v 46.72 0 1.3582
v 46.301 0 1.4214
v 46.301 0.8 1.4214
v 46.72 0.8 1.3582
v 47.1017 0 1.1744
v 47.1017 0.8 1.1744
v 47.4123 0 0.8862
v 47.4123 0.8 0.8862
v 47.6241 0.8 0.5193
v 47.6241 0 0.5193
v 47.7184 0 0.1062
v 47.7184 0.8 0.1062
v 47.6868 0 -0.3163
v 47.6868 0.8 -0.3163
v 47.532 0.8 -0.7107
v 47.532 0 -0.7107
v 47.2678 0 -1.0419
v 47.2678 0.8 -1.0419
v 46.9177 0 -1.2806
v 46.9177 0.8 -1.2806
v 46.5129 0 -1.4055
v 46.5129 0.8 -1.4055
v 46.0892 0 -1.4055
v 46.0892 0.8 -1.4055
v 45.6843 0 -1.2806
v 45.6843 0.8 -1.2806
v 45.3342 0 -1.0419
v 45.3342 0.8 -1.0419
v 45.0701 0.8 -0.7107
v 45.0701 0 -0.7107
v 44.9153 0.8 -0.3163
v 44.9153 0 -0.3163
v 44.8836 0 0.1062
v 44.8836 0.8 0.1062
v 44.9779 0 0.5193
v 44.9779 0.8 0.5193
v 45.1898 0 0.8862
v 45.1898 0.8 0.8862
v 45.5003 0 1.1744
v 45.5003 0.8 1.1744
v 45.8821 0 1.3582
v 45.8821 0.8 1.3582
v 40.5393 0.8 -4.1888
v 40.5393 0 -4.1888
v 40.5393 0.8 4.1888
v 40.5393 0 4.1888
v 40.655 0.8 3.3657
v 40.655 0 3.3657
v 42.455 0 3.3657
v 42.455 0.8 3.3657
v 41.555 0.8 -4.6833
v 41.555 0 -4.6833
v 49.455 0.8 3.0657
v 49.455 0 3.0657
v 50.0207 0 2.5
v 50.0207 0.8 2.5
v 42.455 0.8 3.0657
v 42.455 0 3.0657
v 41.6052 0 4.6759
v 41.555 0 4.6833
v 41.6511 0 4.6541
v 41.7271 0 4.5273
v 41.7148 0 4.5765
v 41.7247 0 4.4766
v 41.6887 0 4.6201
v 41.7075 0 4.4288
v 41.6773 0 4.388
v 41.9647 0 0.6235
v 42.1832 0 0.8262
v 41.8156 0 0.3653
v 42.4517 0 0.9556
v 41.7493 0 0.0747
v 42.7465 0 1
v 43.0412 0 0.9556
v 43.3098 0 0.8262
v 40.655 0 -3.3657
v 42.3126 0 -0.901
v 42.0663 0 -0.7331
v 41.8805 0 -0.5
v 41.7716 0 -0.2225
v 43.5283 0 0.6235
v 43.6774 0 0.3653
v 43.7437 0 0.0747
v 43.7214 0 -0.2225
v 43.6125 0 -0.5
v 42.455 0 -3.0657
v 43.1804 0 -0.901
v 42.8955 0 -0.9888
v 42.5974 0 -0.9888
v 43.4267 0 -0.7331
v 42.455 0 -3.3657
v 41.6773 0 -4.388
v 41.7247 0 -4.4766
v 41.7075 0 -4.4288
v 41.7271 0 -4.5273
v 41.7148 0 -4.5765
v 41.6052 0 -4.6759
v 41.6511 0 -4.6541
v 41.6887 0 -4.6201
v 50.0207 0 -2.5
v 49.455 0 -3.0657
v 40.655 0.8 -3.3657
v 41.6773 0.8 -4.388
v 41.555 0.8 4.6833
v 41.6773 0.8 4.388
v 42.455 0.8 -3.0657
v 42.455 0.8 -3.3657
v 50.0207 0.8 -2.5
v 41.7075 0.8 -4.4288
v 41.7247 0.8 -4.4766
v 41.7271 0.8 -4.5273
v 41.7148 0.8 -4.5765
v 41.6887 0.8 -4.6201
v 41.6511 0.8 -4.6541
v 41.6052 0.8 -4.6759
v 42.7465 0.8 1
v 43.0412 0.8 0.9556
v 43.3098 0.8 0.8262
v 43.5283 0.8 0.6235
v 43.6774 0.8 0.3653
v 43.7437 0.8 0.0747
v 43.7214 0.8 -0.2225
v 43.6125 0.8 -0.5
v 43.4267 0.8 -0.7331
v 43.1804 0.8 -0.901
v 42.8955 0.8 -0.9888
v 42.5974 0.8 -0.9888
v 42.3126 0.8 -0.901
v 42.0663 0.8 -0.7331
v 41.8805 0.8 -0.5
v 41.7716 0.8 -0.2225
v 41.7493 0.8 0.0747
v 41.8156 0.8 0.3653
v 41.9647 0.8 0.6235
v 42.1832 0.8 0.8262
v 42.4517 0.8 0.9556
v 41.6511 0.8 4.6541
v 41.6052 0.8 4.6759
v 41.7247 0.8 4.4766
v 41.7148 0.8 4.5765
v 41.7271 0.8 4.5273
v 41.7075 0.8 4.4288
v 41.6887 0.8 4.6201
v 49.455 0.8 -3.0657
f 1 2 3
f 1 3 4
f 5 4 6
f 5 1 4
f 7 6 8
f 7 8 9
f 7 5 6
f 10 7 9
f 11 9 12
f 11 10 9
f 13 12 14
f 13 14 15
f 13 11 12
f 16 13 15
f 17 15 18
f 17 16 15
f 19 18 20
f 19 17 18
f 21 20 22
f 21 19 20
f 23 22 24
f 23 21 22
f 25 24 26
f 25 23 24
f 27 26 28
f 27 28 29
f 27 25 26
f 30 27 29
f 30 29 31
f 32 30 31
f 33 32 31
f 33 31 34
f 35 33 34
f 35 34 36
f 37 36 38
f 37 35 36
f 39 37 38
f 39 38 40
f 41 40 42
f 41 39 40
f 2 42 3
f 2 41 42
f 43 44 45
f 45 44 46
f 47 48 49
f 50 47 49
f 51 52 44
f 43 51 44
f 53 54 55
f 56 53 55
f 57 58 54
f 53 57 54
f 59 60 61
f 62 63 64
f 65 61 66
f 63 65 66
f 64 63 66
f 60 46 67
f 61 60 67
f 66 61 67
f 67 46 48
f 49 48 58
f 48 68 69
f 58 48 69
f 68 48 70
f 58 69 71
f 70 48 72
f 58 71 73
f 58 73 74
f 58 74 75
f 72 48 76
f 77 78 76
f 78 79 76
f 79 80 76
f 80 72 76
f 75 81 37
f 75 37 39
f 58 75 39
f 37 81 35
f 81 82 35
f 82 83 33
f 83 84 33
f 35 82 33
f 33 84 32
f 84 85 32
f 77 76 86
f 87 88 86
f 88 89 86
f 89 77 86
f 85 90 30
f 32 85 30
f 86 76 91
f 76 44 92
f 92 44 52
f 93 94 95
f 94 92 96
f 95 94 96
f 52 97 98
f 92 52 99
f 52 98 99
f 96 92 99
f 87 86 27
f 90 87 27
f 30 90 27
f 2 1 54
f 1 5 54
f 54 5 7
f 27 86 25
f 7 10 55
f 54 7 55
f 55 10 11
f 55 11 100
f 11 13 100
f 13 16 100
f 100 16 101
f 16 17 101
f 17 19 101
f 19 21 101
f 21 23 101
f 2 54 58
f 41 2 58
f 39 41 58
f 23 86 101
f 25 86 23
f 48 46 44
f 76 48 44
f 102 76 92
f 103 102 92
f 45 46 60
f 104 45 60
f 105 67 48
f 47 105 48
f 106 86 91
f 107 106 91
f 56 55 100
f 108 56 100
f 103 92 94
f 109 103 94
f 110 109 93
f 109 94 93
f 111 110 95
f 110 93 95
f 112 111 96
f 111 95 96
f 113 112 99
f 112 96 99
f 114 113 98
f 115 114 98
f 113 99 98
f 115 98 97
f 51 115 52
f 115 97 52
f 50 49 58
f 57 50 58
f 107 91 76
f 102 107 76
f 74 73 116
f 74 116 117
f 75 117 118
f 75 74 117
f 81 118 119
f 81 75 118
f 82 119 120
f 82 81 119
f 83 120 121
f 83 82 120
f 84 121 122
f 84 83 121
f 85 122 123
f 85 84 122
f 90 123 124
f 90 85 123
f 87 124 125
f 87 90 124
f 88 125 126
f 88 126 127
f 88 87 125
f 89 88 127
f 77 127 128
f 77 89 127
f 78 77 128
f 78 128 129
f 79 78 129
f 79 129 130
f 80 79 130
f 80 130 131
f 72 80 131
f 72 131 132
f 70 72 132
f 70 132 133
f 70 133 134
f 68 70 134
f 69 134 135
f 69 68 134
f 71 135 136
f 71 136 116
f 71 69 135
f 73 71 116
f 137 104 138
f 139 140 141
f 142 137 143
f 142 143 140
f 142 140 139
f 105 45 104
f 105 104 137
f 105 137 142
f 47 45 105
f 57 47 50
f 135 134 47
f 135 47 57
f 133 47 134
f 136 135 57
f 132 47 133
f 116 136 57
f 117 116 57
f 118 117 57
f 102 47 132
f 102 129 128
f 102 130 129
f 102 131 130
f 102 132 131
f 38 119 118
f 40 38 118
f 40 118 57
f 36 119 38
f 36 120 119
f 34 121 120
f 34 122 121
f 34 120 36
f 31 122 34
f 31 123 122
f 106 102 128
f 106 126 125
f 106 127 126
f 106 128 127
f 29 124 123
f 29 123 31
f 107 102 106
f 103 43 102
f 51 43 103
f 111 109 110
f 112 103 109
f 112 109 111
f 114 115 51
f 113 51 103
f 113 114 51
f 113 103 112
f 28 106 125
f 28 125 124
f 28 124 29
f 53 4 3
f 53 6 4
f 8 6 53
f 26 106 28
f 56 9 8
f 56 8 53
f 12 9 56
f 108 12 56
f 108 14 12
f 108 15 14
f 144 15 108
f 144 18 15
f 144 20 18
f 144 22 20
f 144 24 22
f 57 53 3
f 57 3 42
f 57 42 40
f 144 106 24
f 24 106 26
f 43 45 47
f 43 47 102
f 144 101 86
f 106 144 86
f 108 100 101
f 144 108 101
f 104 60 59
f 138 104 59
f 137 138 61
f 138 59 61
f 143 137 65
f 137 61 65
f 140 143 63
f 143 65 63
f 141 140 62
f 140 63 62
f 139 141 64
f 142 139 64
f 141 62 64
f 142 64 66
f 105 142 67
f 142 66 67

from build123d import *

# Parameters (mm, degrees)
SKETCH3_R           = 1
SKETCH3_R_2         = 1.421368712
BOSS_EXTRUDE1_DEPTH = 0.8


with BuildPart() as part:
    # Sketch3 → Boss-Extrude1 (new body)
    with BuildSketch(Plane(origin=(0, 0, 0), x_dir=(1, 0, 0), z_dir=(0, 1, 0))):
        with BuildLine():
            Line((40.65499317, -3.365685425), (42.45499317, -3.365685425))
            Line((42.45499317, -3.365685425), (42.45499317, -3.065685425))
            Line((42.45499317, -3.065685425), (49.45499317, -3.065685425))
            Line((49.45499317, -3.065685425), (50.020678594, -2.5))
            Line((50.020678594, -2.5), (50.020678594, 2.5))
            Line((50.020678594, 2.5), (49.45499317, 3.065685425))
            Line((49.45499317, 3.065685425), (42.45499317, 3.065685425))
            Line((42.45499317, 3.065685425), (42.45499317, 3.365685425))
            Line((42.45499317, 3.365685425), (40.65499317, 3.365685425))
            Line((40.65499317, 3.365685425), (41.67730974, 4.388001996))
            ThreePointArc((41.67730974, 4.388001996), (41.714807471, 4.576515818), (41.55499317, 4.68330032))
            Line((41.55499317, 4.68330032), (40.539309151, 4.188808518))
            Line((40.539309151, 4.188808518), (40.539309151, -4.188808518))
            Line((40.539309151, -4.188808518), (41.55499317, -4.68330032))
            ThreePointArc((41.55499317, -4.68330032), (41.714807471, -4.576515818), (41.67730974, -4.388001996))
            Line((41.67730974, -4.388001996), (40.65499317, -3.365685425))
        make_face()
        with Locations(Location((42.746488922, 0, 0), (0, 0, 270))):
            Circle(SKETCH3_R, mode=Mode.SUBTRACT)
        with Locations(Location((46.301021107, 0, 0), (0, 0, 270))):
            Circle(SKETCH3_R_2, mode=Mode.SUBTRACT)
    extrude(amount=BOSS_EXTRUDE1_DEPTH)


solid = part.part
